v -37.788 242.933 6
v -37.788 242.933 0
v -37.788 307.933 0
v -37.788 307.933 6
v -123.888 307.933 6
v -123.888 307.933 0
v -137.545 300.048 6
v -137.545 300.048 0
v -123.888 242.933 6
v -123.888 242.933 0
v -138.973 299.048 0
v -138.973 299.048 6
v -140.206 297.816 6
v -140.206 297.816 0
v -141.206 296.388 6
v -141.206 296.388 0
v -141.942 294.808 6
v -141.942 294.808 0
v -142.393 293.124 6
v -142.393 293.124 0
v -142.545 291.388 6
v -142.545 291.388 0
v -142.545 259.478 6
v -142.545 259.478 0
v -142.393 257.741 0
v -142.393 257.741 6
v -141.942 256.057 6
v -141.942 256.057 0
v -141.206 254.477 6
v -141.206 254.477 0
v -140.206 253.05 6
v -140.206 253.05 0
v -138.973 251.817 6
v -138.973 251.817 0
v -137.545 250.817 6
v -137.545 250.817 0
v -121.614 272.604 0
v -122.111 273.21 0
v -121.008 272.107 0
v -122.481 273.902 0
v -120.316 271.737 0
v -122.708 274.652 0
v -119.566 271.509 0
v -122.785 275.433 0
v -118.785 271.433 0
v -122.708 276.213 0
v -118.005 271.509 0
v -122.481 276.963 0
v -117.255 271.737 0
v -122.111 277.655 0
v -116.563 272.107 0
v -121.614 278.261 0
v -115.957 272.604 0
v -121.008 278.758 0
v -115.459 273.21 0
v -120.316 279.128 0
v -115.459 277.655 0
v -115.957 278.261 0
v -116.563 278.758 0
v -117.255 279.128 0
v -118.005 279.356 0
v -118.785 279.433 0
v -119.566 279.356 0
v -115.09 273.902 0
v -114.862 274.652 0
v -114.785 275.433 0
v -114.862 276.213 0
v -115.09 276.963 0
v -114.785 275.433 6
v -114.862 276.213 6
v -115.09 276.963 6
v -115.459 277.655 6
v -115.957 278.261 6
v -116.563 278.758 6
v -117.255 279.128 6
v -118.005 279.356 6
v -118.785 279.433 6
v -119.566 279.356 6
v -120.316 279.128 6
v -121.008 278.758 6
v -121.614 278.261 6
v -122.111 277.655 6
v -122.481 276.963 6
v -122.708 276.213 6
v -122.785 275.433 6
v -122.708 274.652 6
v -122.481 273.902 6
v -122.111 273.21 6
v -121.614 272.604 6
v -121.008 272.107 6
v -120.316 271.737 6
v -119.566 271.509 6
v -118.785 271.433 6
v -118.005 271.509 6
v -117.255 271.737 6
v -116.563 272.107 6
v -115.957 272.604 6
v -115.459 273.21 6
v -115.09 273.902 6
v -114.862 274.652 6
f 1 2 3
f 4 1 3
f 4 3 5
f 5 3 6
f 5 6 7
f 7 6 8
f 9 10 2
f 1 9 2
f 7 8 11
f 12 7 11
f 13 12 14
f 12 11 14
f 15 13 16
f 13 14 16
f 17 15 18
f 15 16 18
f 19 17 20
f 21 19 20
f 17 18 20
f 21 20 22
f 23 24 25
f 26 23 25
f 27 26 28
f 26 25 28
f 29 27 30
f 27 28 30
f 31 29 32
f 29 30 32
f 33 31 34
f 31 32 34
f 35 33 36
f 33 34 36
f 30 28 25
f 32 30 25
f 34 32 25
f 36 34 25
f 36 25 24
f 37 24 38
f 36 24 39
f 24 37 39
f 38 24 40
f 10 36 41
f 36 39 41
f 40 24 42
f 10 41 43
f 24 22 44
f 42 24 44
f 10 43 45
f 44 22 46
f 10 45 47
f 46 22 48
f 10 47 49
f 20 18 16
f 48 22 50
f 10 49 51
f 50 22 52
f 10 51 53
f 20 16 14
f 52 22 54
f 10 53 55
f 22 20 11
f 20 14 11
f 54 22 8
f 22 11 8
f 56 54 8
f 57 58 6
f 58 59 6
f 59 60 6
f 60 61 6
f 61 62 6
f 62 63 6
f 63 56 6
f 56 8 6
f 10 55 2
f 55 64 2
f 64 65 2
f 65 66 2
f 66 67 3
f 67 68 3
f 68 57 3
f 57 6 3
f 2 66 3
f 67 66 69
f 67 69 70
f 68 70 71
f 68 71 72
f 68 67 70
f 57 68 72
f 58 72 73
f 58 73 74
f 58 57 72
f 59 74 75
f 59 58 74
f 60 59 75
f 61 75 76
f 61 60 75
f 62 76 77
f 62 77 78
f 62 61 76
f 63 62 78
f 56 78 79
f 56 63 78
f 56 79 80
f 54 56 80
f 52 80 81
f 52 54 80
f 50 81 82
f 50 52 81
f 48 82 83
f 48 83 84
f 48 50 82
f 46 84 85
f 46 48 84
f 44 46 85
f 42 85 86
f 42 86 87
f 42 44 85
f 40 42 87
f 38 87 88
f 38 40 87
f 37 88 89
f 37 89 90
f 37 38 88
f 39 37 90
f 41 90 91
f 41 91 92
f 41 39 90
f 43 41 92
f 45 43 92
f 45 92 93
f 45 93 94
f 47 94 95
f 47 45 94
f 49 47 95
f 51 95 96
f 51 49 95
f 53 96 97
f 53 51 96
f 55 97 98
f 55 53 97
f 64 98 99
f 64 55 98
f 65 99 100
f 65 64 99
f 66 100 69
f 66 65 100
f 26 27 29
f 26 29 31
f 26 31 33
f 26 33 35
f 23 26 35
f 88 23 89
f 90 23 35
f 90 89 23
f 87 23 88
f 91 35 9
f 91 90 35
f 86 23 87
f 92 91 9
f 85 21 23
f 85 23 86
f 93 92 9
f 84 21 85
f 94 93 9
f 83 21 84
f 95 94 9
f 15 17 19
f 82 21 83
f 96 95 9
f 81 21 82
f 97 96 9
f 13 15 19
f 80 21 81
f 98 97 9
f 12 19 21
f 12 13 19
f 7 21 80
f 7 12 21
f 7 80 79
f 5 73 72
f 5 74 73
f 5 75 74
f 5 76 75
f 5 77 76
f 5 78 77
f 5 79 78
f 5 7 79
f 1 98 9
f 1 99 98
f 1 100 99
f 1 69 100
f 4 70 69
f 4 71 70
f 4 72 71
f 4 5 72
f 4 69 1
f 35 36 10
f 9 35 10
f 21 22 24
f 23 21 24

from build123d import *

# Parameters (mm, degrees)
SKETCH1_R           = 4
BOSS_EXTRUDE1_DEPTH = 6


with BuildPart() as part:
    # Sketch1 → Boss-Extrude1 (new body)
    with BuildSketch(Plane.XY):
        with BuildLine():
            Line((-37.787642532, 307.932576411), (-123.887642532, 307.932576411))
            Line((-123.887642532, 307.932576411), (-137.545094515, 300.047977161))
            ThreePointArc((-137.545094515, 300.047977161), (-141.205529316, 296.38770347), (-142.545348637, 291.387576411))
            Line((-142.545348637, 291.387576411), (-142.545348637, 259.477576411))
            ThreePointArc((-142.545348637, 259.477576411), (-141.205529316, 254.477449351), (-137.545094515, 250.817175661))
            Line((-137.545094515, 250.817175661), (-123.887642532, 242.932576411))
            Line((-123.887642532, 242.932576411), (-37.787642532, 242.932576411))
            Line((-37.787642532, 242.932576411), (-37.787642532, 307.932576411))
        make_face()
        with Locations((-118.785348637, 275.432576411)):
            Circle(SKETCH1_R, mode=Mode.SUBTRACT)
    extrude(amount=BOSS_EXTRUDE1_DEPTH)


solid = part.part
